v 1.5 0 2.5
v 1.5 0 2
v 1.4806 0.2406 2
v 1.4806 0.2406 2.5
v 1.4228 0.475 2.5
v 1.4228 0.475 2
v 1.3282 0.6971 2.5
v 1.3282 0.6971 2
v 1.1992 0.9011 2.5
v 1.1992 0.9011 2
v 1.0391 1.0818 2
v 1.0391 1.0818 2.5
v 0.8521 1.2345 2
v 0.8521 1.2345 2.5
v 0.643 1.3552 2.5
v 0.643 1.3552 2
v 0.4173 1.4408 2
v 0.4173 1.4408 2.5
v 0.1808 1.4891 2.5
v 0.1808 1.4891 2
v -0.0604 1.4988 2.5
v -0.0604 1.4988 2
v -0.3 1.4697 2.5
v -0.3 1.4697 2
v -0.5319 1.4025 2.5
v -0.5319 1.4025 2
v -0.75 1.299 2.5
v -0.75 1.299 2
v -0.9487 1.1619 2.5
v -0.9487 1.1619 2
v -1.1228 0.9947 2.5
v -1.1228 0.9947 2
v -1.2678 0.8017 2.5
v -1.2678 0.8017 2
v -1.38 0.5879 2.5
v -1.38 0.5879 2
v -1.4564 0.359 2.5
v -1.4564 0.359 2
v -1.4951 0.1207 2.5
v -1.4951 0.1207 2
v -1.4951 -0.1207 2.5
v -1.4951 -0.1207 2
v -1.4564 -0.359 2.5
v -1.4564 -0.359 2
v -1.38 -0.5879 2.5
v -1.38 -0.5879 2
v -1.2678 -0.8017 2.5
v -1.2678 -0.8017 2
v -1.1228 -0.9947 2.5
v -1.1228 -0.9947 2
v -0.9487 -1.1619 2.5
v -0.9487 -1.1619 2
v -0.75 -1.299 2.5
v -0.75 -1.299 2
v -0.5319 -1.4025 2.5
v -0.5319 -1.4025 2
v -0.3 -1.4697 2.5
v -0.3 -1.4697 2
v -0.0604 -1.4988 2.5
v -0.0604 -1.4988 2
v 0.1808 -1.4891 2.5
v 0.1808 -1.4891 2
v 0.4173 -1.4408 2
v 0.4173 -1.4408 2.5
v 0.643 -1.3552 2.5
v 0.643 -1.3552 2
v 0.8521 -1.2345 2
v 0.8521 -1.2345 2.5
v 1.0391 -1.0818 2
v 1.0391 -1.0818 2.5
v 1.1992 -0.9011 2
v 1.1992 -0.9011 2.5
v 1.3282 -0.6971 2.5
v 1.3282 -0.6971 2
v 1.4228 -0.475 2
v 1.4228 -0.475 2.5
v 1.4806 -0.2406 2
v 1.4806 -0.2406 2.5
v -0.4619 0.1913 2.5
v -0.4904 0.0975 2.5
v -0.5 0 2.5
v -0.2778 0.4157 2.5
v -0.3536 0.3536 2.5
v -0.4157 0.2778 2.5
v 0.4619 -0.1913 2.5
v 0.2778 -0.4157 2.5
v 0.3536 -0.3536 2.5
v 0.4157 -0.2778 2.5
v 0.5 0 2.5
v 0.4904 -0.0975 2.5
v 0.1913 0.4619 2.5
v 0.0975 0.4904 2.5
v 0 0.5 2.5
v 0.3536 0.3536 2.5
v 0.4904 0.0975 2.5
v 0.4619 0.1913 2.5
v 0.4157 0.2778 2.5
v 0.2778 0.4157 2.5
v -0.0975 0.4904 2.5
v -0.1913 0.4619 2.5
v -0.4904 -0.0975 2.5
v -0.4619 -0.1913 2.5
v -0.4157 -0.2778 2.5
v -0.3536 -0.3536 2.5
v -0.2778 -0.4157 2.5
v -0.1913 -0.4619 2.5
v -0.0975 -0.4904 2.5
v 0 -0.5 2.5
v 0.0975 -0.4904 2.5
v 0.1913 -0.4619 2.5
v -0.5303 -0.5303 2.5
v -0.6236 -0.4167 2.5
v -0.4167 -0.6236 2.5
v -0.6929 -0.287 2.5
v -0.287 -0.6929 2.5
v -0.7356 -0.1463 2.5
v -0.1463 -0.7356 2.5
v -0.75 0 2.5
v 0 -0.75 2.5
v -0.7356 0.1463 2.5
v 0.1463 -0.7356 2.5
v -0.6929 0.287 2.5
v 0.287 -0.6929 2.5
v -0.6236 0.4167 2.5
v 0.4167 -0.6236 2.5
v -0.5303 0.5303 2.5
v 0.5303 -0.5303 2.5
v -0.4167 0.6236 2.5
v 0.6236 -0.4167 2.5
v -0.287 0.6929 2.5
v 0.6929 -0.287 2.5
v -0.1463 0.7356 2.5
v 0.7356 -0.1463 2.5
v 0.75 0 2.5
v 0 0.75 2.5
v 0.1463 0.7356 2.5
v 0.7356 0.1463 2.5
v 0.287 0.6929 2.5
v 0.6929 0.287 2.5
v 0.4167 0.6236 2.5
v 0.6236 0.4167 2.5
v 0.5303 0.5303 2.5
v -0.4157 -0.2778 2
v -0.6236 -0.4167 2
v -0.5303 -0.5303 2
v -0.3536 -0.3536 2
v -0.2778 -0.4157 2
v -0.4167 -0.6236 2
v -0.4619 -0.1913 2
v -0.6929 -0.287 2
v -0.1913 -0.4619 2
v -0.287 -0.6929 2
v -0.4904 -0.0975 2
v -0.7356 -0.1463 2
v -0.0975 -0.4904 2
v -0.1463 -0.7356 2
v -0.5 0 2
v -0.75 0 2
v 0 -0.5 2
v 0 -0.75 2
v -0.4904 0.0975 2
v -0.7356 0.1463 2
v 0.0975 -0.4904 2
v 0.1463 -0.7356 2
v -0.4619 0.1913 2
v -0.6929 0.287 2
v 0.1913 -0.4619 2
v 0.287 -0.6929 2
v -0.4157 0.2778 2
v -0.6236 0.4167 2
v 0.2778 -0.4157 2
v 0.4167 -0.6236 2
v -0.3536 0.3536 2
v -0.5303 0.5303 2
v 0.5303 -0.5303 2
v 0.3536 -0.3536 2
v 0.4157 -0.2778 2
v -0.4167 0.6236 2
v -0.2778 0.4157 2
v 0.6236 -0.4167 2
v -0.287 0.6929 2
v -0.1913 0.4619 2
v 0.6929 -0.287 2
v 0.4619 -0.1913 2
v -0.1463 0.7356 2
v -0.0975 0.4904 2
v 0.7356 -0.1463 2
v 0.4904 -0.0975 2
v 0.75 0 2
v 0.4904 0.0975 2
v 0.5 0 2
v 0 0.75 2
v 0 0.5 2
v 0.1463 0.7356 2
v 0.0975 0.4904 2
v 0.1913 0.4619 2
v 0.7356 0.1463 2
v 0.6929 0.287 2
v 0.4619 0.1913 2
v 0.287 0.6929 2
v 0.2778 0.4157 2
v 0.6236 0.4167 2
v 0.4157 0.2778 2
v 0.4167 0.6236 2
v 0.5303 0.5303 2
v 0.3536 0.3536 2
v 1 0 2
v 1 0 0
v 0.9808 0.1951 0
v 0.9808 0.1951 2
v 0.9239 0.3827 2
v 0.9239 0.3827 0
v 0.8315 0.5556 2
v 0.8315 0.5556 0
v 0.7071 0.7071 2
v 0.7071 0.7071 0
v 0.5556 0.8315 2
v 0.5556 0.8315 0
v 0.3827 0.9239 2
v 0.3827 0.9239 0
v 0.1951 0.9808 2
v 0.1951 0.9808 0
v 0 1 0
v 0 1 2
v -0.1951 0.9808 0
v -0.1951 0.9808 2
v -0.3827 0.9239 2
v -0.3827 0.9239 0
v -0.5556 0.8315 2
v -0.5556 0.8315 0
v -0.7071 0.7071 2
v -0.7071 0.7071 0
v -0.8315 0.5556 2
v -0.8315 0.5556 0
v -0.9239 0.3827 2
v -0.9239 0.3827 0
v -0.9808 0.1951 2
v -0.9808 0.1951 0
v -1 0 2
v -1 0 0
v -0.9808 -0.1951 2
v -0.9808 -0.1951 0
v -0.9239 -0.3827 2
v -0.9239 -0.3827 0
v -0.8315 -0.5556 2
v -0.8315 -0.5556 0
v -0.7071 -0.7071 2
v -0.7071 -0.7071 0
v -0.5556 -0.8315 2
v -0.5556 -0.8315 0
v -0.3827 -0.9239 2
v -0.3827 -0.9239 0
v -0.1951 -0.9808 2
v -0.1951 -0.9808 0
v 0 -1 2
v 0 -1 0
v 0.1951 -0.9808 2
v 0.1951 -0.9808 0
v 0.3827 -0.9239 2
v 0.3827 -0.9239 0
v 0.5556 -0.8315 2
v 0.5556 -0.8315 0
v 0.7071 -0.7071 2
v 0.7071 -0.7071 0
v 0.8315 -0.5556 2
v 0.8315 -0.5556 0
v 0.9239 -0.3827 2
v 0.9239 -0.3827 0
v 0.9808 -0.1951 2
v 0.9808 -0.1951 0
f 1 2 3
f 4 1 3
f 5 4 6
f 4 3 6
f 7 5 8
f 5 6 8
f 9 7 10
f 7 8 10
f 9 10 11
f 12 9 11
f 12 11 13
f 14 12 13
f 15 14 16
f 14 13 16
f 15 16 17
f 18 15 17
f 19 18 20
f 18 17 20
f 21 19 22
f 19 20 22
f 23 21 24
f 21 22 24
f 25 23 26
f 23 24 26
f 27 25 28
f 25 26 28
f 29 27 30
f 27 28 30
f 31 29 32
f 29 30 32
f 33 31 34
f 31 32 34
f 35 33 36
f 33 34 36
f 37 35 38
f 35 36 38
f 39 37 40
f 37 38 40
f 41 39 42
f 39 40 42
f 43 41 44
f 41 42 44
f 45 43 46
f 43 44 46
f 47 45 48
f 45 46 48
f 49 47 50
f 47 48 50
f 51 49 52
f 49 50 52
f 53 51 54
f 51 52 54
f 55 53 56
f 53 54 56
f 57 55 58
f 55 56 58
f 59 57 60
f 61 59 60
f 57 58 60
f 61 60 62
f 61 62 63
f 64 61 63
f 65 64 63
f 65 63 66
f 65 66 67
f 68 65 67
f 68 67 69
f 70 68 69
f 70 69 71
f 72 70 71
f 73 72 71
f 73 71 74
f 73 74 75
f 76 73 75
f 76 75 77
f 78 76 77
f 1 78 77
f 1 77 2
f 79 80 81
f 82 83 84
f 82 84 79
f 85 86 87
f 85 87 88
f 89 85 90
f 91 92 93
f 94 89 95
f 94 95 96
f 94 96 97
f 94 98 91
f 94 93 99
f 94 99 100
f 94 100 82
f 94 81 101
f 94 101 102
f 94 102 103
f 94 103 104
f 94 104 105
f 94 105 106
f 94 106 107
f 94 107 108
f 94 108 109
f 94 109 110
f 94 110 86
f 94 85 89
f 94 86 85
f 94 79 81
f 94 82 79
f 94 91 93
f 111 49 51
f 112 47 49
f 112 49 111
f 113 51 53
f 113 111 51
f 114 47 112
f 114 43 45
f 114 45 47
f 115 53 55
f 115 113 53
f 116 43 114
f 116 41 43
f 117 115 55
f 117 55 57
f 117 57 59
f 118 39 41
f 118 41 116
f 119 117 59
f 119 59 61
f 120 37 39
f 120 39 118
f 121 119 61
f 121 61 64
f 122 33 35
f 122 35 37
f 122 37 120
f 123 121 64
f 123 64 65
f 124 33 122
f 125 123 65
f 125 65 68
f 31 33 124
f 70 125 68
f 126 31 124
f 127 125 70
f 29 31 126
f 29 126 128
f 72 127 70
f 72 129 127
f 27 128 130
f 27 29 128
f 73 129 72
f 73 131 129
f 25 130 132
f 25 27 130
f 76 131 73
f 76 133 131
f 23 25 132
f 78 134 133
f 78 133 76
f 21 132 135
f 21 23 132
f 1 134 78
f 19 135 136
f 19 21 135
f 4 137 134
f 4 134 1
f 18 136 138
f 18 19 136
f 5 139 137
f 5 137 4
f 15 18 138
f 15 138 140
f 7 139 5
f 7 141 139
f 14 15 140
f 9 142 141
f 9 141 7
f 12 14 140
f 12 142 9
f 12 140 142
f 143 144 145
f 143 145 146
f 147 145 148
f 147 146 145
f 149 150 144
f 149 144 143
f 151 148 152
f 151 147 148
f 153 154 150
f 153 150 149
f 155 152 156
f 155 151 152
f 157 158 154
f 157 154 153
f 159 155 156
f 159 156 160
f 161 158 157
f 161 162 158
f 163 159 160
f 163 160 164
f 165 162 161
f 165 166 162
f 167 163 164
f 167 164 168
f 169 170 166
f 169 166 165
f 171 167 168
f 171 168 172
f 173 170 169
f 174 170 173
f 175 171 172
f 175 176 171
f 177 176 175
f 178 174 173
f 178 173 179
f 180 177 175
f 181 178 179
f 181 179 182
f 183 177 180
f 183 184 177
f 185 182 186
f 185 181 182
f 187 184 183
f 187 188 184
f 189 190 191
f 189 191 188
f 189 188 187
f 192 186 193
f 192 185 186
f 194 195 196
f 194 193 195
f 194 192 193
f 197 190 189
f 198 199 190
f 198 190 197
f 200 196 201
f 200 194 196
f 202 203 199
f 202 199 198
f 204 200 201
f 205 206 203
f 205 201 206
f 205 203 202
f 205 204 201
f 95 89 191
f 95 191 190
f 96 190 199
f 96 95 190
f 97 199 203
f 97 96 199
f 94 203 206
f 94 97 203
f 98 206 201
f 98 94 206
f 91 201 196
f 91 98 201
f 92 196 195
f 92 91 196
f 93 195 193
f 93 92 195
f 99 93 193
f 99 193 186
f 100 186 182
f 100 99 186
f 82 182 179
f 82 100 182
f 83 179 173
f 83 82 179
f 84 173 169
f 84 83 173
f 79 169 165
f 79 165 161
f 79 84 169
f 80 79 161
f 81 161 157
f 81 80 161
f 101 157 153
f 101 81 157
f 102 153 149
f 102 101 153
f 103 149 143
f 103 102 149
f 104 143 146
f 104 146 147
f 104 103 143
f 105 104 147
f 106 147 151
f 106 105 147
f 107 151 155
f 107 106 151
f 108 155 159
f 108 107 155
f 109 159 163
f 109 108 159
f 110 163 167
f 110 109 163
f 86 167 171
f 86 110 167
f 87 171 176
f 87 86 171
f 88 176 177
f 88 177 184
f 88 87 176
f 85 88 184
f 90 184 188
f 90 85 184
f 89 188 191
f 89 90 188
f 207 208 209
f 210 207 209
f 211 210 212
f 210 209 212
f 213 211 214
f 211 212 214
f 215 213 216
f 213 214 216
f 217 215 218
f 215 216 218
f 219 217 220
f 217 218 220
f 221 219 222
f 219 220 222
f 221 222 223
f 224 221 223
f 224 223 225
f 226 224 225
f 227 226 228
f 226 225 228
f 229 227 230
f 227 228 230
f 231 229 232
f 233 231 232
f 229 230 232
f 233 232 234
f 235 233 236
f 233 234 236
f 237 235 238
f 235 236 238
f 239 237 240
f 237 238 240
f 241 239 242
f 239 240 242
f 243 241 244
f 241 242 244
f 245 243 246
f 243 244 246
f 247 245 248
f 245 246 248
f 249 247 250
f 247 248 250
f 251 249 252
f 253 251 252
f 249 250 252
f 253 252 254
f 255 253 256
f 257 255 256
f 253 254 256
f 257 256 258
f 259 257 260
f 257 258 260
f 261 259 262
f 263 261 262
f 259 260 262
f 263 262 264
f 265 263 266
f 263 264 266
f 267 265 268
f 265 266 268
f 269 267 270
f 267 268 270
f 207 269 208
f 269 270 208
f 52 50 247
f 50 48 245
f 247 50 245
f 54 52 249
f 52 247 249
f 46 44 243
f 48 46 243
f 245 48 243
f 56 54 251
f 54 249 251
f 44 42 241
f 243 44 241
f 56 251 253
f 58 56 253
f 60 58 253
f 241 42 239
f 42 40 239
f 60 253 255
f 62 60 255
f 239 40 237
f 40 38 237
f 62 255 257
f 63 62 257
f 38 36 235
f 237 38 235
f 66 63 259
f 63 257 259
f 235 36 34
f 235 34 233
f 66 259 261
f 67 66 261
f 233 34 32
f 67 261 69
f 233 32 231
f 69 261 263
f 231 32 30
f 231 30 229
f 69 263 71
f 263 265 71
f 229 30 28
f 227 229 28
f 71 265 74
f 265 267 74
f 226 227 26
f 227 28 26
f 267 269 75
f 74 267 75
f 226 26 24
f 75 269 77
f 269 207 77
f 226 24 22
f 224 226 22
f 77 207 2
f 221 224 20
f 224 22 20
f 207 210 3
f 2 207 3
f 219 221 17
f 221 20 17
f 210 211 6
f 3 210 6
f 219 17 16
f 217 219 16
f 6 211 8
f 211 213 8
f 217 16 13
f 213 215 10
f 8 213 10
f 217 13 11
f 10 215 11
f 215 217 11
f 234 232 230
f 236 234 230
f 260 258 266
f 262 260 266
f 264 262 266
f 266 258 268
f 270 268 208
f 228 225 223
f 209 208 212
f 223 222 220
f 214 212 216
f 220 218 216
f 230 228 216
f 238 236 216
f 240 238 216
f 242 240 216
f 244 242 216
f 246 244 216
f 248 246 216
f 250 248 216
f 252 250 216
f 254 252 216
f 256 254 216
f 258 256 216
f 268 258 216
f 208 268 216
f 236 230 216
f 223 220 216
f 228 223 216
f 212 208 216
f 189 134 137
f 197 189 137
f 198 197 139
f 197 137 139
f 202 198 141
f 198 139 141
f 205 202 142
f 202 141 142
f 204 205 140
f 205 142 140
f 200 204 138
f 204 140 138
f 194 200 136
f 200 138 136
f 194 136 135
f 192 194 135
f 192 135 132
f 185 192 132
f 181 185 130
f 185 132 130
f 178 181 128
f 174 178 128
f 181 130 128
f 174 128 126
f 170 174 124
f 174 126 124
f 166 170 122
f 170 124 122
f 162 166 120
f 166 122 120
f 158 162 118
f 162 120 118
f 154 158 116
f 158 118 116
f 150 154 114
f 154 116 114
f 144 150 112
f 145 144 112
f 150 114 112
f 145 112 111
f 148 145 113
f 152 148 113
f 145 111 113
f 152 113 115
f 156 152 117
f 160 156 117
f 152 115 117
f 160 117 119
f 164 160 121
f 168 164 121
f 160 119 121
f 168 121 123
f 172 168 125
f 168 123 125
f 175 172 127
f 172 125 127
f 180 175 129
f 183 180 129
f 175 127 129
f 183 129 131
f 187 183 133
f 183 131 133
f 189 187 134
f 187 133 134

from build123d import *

# Parameters (mm, degrees)
SKETCH1_R           = 1
BOSS_EXTRUDE1_DEPTH = 2
SKETCH2_R           = 1.5
BOSS_EXTRUDE2_DEPTH = 0.5
SKETCH3_R           = 0.75
SKETCH3_R_2         = 0.5
CUT_EXTRUDE1_DEPTH  = 0.5


with BuildPart() as part:
    # Sketch1 → Boss-Extrude1 (new body)
    with BuildSketch(Plane.XY):
        Circle(SKETCH1_R)
    extrude(amount=BOSS_EXTRUDE1_DEPTH)

    # Sketch2 → Boss-Extrude2 (add)
    with BuildSketch(Plane.XY.offset(2)):
        Circle(SKETCH2_R)
    extrude(amount=BOSS_EXTRUDE2_DEPTH)

    # Sketch3 → Cut-Extrude1 (cut)
    with BuildSketch(Plane.XY.offset(2.5)):
        Circle(SKETCH3_R)
        Circle(SKETCH3_R_2, mode=Mode.SUBTRACT)
    extrude(amount=-CUT_EXTRUDE1_DEPTH, mode=Mode.SUBTRACT)


solid = part.part
